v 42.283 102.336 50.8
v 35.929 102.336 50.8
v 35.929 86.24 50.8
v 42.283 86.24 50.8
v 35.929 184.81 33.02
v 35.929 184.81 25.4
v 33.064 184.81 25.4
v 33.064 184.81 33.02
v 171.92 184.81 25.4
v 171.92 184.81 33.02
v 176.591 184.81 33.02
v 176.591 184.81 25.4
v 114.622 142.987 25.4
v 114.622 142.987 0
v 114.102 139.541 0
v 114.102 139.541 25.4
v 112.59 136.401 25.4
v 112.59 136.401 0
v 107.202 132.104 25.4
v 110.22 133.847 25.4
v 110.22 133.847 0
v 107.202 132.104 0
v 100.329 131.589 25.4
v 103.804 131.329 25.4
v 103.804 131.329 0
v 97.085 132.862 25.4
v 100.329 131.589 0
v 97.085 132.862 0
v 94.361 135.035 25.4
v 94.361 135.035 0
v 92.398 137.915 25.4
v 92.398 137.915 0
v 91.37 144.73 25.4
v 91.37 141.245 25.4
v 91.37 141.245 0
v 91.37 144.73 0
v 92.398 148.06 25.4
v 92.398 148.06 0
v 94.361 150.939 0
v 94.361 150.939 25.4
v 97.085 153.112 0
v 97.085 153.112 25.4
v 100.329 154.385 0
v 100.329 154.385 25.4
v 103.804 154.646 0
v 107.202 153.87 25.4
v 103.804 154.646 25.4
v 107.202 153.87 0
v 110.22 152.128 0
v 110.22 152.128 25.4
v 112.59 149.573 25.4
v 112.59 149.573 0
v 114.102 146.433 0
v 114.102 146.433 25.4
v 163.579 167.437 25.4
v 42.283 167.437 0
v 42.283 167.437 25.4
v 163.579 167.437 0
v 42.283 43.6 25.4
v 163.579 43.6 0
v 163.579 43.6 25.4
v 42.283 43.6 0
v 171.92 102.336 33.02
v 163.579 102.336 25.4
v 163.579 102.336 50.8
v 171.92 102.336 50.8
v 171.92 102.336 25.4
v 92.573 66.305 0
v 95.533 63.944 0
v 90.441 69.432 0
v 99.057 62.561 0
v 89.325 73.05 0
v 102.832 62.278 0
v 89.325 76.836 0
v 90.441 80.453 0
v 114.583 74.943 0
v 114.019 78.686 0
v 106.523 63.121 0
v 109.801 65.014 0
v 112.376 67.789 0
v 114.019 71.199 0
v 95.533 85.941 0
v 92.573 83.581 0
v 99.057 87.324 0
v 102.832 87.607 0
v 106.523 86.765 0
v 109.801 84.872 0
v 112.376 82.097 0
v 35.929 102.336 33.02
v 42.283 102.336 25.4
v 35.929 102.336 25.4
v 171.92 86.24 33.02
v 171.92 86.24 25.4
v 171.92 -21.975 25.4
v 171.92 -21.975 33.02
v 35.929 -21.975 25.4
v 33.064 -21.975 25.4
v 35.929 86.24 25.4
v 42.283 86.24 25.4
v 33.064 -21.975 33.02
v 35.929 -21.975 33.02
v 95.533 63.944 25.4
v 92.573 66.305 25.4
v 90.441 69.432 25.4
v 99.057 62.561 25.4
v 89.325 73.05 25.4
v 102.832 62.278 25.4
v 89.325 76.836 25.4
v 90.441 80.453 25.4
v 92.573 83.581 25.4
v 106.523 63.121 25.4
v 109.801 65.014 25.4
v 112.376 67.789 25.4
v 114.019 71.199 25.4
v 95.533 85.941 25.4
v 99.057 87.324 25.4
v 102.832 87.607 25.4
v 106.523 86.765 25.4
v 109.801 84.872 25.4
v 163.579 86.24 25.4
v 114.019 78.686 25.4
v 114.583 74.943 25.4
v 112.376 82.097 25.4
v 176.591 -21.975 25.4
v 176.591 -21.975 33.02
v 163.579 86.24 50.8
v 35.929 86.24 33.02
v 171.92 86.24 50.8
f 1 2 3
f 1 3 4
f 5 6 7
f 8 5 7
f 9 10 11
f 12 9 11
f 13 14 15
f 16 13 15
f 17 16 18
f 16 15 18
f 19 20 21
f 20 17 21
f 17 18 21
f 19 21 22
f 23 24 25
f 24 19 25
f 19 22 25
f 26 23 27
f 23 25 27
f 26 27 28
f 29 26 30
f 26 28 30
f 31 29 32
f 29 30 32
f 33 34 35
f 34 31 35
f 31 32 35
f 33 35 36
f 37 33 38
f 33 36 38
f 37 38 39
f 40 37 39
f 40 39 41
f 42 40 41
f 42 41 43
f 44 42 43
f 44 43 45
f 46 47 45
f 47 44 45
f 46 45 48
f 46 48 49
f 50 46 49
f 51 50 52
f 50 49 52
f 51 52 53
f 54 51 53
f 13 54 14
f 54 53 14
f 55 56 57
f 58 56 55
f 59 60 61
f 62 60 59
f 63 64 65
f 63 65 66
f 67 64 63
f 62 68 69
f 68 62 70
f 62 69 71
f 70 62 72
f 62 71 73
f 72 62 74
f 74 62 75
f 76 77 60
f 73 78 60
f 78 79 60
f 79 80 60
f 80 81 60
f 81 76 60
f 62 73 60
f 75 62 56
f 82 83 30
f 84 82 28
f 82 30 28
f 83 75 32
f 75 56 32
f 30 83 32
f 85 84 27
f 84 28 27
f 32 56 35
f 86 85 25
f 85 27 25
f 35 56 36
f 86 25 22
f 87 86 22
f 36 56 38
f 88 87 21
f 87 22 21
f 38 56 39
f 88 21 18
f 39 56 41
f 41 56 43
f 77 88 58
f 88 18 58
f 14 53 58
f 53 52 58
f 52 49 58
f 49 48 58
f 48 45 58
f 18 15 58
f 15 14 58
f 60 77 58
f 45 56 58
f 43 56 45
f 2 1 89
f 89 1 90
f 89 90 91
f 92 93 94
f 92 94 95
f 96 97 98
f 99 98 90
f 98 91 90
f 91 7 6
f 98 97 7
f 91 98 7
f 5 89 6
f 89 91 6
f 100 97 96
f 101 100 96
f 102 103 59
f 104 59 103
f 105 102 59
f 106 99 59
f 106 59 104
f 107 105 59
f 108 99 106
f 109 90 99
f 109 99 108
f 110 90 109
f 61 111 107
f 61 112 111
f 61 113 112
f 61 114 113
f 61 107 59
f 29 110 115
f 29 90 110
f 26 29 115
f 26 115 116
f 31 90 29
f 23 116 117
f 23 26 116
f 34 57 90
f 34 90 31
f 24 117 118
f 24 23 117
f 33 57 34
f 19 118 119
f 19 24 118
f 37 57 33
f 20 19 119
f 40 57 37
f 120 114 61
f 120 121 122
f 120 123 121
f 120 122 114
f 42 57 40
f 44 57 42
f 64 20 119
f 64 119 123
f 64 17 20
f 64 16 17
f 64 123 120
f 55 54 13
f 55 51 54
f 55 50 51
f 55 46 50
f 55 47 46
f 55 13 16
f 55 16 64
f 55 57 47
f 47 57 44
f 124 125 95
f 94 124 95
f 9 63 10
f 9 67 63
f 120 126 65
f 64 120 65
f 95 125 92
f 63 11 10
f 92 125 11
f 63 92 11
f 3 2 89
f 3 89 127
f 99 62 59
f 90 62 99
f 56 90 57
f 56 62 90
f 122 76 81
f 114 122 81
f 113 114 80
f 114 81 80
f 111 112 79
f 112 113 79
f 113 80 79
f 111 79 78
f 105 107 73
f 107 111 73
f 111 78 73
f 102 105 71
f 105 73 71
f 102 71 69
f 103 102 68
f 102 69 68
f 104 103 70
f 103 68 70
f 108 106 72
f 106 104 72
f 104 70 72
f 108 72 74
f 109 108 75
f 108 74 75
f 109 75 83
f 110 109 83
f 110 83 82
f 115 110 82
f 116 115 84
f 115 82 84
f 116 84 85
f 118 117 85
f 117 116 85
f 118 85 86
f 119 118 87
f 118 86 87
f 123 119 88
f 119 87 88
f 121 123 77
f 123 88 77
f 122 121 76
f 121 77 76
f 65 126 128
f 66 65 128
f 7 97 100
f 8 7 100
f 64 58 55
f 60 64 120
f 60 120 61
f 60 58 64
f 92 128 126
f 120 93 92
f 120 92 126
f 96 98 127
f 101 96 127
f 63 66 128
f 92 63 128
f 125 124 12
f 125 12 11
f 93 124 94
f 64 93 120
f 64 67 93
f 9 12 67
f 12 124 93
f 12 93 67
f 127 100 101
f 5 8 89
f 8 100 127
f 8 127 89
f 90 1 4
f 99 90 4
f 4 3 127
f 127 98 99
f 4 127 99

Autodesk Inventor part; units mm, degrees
ref_plane "YZ Plane" through (0, 0, 0) normal (1, 0, 0) x (0, 1, 0)
ref_plane "XZ Plane" through (0, 0, 0) normal (0, 1, 0) x (-1, 0, 0)
ref_plane "XY Plane" through (0, 0, 0) normal (0, 0, 1) x (1, 0, 0)
sketch "Sketch1" plane through (0, 0, 0) normal (0, 0, 1) x (1, 0, 0)
  circle A0 centre (101.883, 74.9428) radius 12.7
  line L0 (42.2826, 167.437) -> (163.579, 167.437)
  line L1 (163.579, 167.437) -> (163.579, 43.6004)
  line L2 (163.579, 43.6004) -> (42.2826, 43.6004)
  line L3 (42.2826, 43.6004) -> (42.2826, 167.437)
  circle A1 centre (102.9308, 142.9872) radius 11.691
  line L4 (42.2826, 116.6323) -> (31.1691, 116.6323)
  line L5 (31.1691, 116.6323) -> (31.1691, 96.9454)
  line L6 (31.1691, 96.9454) -> (42.2826, 96.9454)
  line L7 (42.2826, 96.9454) -> (42.2826, 116.6323)
  line L8 (163.579, 116.6323) -> (174.375, 116.6323)
  line L9 (174.375, 116.6323) -> (174.375, 96.9454)
  line L10 (174.375, 96.9454) -> (163.579, 96.9454)
  line L11 (163.579, 96.9454) -> (163.579, 116.6323)
  line L12 (31.1691, 126.4757) -> (23.2309, 126.4757)
  line L13 (23.2309, 126.4757) -> (23.2309, 0)
  line L14 (23.2309, 0) -> (31.1691, 0)
  line L15 (31.1691, 0) -> (31.1691, 126.4757)
  line L16 (174.375, 126.4757) -> (184.536, 126.4757)
  line L17 (184.536, 126.4757) -> (184.536, 0)
  line L18 (184.536, 0) -> (174.375, 0)
  line L19 (174.375, 0) -> (174.375, 126.4757)
  point P0 (0, 0)
  dimension "d0" = 25.4
extrude "Extrusion1" add sketch "Sketch1" along normal blind 25.4 contours L0 L1 L2 L3
sketch "Sketch2" plane through (0, 0, 25.4) normal (0, 0, 1) x (1, 0, 0)
  line L0 (42.2826, 167.437) -> (42.2826, 43.6004) projected
  line L1 (42.2826, 102.3361) -> (35.9288, 102.3361)
  line L2 (35.9288, 102.3361) -> (35.9288, 86.2401)
  line L3 (35.9288, 86.2401) -> (42.2826, 86.2401)
  line L4 (42.2826, 86.2401) -> (42.2826, 102.3361)
  line L5 (163.579, 43.6004) -> (163.579, 167.437) projected
  line L6 (163.579, 102.3361) -> (171.9195, 102.3361)
  line L7 (171.9195, 102.3361) -> (171.9195, 86.2401)
  line L8 (171.9195, 86.2401) -> (163.579, 86.2401)
  line L9 (163.579, 86.2401) -> (163.579, 102.3361)
  point P0 (0, 0)
extrude "Extrusion2" add sketch "Sketch2" along normal blind 25.4
sketch "Sketch3" plane through (0, 0, 25.4) normal (0, 0, 1) x (1, 0, 0)
  circle A0 centre (101.883, 74.9428) radius 12.7 projected
  line L0 (35.9288, 184.8101) -> (33.0642, 184.8101)
  line L1 (33.0642, 184.8101) -> (33.0642, -10.6552)
  line L2 (33.0642, -10.6552) -> (35.9288, -10.6552)
  line L3 (35.9288, -10.6552) -> (35.9288, 184.8101)
  line L4 (171.9195, 184.8101) -> (176.5914, 184.8101)
  line L5 (176.5914, 184.8101) -> (176.5914, -10.6552)
  line L6 (176.5914, -10.6552) -> (171.9195, -10.6552)
  line L7 (171.9195, -10.6552) -> (171.9195, 184.8101)
  point P0 (0, 0)
extrude "Extrusion3" add sketch "Sketch3" along normal blind 7.62 contours L3 L2 L1 L0 | L4 L5 L6 L7
move faces "Move Face1" translate (0, -11.32, 0) faces at (175.0341, -10.6552, 27.94) (34.0191, -10.6552, 27.94)
properties part number "filter wheel"
